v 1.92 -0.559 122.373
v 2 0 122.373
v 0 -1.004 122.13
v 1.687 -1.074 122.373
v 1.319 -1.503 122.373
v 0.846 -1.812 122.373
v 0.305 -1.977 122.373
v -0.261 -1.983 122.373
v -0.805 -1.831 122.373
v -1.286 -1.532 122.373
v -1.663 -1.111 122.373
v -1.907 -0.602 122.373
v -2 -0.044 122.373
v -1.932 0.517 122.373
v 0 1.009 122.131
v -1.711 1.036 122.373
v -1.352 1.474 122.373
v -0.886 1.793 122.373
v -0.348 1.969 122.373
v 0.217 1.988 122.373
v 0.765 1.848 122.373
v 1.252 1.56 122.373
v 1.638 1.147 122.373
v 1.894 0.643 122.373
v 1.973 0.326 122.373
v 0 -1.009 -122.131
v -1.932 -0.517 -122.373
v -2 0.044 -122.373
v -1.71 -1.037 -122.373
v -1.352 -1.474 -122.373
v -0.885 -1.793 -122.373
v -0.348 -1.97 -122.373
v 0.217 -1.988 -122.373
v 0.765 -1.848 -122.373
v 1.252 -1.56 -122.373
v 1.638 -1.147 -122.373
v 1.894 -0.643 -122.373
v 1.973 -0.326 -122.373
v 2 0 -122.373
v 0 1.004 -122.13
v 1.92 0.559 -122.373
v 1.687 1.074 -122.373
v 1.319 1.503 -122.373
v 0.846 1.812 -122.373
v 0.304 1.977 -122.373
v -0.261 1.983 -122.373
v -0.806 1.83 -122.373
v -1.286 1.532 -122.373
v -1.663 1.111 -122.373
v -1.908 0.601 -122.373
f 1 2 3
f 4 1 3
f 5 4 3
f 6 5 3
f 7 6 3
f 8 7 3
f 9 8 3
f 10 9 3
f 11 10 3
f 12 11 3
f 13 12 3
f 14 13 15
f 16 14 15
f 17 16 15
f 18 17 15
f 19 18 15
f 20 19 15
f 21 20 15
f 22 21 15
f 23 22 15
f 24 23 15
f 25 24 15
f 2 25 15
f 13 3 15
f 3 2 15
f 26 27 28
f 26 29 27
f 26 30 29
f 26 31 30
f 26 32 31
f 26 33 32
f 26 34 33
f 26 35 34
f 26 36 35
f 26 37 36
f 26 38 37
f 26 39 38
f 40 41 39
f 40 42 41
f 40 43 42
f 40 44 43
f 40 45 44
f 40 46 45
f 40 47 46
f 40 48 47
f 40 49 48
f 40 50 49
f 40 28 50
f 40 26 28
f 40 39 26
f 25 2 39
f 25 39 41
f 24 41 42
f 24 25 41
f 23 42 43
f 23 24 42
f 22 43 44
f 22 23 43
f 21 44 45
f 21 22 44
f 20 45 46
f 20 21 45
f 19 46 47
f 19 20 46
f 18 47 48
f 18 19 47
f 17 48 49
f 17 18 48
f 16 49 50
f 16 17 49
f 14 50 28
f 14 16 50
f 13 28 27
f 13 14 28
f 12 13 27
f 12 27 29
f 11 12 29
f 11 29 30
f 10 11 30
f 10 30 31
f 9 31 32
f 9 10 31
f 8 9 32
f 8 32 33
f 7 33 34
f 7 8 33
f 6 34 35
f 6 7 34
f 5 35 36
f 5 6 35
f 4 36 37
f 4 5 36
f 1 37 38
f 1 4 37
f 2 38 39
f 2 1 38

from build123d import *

# Parameters (mm, degrees)
ESQUISSE1_R        = 2
BOSS_EXTRU_1_DEPTH = 128.4


with BuildPart() as part:
    # Esquisse1 → Boss.-Extru.1 (new, symmetric)
    with BuildSketch(Plane.XY):
        Circle(ESQUISSE1_R)
    extrude(amount=BOSS_EXTRU_1_DEPTH, both=True)

    # Esquisse2 → Enlèvement de matière-Révolution1 (revolve, cut)
    with BuildSketch(Plane(origin=(0, 0, 0), x_dir=(1, 0, 0), z_dir=(0, 1, 0))):
        with BuildLine():
            Line((6.35, 128.4), (-6.35, 128.4))
            ThreePointArc((-6.35, 128.4), (-1.17e-15, 122.05000000000001), (6.35, 128.4))
        make_face()
    enl_vement_de_mati_re_r_volution1 = revolve(axis=Axis((6.35, 0, -128.4), (-1, 0, 0)), mode=Mode.SUBTRACT)

    # Symétrie1: Enlèvement de matière-Révolution1 across plane
    add(enl_vement_de_mati_re_r_volution1.mirror(Plane.XY), mode=Mode.SUBTRACT)


solid = part.part
